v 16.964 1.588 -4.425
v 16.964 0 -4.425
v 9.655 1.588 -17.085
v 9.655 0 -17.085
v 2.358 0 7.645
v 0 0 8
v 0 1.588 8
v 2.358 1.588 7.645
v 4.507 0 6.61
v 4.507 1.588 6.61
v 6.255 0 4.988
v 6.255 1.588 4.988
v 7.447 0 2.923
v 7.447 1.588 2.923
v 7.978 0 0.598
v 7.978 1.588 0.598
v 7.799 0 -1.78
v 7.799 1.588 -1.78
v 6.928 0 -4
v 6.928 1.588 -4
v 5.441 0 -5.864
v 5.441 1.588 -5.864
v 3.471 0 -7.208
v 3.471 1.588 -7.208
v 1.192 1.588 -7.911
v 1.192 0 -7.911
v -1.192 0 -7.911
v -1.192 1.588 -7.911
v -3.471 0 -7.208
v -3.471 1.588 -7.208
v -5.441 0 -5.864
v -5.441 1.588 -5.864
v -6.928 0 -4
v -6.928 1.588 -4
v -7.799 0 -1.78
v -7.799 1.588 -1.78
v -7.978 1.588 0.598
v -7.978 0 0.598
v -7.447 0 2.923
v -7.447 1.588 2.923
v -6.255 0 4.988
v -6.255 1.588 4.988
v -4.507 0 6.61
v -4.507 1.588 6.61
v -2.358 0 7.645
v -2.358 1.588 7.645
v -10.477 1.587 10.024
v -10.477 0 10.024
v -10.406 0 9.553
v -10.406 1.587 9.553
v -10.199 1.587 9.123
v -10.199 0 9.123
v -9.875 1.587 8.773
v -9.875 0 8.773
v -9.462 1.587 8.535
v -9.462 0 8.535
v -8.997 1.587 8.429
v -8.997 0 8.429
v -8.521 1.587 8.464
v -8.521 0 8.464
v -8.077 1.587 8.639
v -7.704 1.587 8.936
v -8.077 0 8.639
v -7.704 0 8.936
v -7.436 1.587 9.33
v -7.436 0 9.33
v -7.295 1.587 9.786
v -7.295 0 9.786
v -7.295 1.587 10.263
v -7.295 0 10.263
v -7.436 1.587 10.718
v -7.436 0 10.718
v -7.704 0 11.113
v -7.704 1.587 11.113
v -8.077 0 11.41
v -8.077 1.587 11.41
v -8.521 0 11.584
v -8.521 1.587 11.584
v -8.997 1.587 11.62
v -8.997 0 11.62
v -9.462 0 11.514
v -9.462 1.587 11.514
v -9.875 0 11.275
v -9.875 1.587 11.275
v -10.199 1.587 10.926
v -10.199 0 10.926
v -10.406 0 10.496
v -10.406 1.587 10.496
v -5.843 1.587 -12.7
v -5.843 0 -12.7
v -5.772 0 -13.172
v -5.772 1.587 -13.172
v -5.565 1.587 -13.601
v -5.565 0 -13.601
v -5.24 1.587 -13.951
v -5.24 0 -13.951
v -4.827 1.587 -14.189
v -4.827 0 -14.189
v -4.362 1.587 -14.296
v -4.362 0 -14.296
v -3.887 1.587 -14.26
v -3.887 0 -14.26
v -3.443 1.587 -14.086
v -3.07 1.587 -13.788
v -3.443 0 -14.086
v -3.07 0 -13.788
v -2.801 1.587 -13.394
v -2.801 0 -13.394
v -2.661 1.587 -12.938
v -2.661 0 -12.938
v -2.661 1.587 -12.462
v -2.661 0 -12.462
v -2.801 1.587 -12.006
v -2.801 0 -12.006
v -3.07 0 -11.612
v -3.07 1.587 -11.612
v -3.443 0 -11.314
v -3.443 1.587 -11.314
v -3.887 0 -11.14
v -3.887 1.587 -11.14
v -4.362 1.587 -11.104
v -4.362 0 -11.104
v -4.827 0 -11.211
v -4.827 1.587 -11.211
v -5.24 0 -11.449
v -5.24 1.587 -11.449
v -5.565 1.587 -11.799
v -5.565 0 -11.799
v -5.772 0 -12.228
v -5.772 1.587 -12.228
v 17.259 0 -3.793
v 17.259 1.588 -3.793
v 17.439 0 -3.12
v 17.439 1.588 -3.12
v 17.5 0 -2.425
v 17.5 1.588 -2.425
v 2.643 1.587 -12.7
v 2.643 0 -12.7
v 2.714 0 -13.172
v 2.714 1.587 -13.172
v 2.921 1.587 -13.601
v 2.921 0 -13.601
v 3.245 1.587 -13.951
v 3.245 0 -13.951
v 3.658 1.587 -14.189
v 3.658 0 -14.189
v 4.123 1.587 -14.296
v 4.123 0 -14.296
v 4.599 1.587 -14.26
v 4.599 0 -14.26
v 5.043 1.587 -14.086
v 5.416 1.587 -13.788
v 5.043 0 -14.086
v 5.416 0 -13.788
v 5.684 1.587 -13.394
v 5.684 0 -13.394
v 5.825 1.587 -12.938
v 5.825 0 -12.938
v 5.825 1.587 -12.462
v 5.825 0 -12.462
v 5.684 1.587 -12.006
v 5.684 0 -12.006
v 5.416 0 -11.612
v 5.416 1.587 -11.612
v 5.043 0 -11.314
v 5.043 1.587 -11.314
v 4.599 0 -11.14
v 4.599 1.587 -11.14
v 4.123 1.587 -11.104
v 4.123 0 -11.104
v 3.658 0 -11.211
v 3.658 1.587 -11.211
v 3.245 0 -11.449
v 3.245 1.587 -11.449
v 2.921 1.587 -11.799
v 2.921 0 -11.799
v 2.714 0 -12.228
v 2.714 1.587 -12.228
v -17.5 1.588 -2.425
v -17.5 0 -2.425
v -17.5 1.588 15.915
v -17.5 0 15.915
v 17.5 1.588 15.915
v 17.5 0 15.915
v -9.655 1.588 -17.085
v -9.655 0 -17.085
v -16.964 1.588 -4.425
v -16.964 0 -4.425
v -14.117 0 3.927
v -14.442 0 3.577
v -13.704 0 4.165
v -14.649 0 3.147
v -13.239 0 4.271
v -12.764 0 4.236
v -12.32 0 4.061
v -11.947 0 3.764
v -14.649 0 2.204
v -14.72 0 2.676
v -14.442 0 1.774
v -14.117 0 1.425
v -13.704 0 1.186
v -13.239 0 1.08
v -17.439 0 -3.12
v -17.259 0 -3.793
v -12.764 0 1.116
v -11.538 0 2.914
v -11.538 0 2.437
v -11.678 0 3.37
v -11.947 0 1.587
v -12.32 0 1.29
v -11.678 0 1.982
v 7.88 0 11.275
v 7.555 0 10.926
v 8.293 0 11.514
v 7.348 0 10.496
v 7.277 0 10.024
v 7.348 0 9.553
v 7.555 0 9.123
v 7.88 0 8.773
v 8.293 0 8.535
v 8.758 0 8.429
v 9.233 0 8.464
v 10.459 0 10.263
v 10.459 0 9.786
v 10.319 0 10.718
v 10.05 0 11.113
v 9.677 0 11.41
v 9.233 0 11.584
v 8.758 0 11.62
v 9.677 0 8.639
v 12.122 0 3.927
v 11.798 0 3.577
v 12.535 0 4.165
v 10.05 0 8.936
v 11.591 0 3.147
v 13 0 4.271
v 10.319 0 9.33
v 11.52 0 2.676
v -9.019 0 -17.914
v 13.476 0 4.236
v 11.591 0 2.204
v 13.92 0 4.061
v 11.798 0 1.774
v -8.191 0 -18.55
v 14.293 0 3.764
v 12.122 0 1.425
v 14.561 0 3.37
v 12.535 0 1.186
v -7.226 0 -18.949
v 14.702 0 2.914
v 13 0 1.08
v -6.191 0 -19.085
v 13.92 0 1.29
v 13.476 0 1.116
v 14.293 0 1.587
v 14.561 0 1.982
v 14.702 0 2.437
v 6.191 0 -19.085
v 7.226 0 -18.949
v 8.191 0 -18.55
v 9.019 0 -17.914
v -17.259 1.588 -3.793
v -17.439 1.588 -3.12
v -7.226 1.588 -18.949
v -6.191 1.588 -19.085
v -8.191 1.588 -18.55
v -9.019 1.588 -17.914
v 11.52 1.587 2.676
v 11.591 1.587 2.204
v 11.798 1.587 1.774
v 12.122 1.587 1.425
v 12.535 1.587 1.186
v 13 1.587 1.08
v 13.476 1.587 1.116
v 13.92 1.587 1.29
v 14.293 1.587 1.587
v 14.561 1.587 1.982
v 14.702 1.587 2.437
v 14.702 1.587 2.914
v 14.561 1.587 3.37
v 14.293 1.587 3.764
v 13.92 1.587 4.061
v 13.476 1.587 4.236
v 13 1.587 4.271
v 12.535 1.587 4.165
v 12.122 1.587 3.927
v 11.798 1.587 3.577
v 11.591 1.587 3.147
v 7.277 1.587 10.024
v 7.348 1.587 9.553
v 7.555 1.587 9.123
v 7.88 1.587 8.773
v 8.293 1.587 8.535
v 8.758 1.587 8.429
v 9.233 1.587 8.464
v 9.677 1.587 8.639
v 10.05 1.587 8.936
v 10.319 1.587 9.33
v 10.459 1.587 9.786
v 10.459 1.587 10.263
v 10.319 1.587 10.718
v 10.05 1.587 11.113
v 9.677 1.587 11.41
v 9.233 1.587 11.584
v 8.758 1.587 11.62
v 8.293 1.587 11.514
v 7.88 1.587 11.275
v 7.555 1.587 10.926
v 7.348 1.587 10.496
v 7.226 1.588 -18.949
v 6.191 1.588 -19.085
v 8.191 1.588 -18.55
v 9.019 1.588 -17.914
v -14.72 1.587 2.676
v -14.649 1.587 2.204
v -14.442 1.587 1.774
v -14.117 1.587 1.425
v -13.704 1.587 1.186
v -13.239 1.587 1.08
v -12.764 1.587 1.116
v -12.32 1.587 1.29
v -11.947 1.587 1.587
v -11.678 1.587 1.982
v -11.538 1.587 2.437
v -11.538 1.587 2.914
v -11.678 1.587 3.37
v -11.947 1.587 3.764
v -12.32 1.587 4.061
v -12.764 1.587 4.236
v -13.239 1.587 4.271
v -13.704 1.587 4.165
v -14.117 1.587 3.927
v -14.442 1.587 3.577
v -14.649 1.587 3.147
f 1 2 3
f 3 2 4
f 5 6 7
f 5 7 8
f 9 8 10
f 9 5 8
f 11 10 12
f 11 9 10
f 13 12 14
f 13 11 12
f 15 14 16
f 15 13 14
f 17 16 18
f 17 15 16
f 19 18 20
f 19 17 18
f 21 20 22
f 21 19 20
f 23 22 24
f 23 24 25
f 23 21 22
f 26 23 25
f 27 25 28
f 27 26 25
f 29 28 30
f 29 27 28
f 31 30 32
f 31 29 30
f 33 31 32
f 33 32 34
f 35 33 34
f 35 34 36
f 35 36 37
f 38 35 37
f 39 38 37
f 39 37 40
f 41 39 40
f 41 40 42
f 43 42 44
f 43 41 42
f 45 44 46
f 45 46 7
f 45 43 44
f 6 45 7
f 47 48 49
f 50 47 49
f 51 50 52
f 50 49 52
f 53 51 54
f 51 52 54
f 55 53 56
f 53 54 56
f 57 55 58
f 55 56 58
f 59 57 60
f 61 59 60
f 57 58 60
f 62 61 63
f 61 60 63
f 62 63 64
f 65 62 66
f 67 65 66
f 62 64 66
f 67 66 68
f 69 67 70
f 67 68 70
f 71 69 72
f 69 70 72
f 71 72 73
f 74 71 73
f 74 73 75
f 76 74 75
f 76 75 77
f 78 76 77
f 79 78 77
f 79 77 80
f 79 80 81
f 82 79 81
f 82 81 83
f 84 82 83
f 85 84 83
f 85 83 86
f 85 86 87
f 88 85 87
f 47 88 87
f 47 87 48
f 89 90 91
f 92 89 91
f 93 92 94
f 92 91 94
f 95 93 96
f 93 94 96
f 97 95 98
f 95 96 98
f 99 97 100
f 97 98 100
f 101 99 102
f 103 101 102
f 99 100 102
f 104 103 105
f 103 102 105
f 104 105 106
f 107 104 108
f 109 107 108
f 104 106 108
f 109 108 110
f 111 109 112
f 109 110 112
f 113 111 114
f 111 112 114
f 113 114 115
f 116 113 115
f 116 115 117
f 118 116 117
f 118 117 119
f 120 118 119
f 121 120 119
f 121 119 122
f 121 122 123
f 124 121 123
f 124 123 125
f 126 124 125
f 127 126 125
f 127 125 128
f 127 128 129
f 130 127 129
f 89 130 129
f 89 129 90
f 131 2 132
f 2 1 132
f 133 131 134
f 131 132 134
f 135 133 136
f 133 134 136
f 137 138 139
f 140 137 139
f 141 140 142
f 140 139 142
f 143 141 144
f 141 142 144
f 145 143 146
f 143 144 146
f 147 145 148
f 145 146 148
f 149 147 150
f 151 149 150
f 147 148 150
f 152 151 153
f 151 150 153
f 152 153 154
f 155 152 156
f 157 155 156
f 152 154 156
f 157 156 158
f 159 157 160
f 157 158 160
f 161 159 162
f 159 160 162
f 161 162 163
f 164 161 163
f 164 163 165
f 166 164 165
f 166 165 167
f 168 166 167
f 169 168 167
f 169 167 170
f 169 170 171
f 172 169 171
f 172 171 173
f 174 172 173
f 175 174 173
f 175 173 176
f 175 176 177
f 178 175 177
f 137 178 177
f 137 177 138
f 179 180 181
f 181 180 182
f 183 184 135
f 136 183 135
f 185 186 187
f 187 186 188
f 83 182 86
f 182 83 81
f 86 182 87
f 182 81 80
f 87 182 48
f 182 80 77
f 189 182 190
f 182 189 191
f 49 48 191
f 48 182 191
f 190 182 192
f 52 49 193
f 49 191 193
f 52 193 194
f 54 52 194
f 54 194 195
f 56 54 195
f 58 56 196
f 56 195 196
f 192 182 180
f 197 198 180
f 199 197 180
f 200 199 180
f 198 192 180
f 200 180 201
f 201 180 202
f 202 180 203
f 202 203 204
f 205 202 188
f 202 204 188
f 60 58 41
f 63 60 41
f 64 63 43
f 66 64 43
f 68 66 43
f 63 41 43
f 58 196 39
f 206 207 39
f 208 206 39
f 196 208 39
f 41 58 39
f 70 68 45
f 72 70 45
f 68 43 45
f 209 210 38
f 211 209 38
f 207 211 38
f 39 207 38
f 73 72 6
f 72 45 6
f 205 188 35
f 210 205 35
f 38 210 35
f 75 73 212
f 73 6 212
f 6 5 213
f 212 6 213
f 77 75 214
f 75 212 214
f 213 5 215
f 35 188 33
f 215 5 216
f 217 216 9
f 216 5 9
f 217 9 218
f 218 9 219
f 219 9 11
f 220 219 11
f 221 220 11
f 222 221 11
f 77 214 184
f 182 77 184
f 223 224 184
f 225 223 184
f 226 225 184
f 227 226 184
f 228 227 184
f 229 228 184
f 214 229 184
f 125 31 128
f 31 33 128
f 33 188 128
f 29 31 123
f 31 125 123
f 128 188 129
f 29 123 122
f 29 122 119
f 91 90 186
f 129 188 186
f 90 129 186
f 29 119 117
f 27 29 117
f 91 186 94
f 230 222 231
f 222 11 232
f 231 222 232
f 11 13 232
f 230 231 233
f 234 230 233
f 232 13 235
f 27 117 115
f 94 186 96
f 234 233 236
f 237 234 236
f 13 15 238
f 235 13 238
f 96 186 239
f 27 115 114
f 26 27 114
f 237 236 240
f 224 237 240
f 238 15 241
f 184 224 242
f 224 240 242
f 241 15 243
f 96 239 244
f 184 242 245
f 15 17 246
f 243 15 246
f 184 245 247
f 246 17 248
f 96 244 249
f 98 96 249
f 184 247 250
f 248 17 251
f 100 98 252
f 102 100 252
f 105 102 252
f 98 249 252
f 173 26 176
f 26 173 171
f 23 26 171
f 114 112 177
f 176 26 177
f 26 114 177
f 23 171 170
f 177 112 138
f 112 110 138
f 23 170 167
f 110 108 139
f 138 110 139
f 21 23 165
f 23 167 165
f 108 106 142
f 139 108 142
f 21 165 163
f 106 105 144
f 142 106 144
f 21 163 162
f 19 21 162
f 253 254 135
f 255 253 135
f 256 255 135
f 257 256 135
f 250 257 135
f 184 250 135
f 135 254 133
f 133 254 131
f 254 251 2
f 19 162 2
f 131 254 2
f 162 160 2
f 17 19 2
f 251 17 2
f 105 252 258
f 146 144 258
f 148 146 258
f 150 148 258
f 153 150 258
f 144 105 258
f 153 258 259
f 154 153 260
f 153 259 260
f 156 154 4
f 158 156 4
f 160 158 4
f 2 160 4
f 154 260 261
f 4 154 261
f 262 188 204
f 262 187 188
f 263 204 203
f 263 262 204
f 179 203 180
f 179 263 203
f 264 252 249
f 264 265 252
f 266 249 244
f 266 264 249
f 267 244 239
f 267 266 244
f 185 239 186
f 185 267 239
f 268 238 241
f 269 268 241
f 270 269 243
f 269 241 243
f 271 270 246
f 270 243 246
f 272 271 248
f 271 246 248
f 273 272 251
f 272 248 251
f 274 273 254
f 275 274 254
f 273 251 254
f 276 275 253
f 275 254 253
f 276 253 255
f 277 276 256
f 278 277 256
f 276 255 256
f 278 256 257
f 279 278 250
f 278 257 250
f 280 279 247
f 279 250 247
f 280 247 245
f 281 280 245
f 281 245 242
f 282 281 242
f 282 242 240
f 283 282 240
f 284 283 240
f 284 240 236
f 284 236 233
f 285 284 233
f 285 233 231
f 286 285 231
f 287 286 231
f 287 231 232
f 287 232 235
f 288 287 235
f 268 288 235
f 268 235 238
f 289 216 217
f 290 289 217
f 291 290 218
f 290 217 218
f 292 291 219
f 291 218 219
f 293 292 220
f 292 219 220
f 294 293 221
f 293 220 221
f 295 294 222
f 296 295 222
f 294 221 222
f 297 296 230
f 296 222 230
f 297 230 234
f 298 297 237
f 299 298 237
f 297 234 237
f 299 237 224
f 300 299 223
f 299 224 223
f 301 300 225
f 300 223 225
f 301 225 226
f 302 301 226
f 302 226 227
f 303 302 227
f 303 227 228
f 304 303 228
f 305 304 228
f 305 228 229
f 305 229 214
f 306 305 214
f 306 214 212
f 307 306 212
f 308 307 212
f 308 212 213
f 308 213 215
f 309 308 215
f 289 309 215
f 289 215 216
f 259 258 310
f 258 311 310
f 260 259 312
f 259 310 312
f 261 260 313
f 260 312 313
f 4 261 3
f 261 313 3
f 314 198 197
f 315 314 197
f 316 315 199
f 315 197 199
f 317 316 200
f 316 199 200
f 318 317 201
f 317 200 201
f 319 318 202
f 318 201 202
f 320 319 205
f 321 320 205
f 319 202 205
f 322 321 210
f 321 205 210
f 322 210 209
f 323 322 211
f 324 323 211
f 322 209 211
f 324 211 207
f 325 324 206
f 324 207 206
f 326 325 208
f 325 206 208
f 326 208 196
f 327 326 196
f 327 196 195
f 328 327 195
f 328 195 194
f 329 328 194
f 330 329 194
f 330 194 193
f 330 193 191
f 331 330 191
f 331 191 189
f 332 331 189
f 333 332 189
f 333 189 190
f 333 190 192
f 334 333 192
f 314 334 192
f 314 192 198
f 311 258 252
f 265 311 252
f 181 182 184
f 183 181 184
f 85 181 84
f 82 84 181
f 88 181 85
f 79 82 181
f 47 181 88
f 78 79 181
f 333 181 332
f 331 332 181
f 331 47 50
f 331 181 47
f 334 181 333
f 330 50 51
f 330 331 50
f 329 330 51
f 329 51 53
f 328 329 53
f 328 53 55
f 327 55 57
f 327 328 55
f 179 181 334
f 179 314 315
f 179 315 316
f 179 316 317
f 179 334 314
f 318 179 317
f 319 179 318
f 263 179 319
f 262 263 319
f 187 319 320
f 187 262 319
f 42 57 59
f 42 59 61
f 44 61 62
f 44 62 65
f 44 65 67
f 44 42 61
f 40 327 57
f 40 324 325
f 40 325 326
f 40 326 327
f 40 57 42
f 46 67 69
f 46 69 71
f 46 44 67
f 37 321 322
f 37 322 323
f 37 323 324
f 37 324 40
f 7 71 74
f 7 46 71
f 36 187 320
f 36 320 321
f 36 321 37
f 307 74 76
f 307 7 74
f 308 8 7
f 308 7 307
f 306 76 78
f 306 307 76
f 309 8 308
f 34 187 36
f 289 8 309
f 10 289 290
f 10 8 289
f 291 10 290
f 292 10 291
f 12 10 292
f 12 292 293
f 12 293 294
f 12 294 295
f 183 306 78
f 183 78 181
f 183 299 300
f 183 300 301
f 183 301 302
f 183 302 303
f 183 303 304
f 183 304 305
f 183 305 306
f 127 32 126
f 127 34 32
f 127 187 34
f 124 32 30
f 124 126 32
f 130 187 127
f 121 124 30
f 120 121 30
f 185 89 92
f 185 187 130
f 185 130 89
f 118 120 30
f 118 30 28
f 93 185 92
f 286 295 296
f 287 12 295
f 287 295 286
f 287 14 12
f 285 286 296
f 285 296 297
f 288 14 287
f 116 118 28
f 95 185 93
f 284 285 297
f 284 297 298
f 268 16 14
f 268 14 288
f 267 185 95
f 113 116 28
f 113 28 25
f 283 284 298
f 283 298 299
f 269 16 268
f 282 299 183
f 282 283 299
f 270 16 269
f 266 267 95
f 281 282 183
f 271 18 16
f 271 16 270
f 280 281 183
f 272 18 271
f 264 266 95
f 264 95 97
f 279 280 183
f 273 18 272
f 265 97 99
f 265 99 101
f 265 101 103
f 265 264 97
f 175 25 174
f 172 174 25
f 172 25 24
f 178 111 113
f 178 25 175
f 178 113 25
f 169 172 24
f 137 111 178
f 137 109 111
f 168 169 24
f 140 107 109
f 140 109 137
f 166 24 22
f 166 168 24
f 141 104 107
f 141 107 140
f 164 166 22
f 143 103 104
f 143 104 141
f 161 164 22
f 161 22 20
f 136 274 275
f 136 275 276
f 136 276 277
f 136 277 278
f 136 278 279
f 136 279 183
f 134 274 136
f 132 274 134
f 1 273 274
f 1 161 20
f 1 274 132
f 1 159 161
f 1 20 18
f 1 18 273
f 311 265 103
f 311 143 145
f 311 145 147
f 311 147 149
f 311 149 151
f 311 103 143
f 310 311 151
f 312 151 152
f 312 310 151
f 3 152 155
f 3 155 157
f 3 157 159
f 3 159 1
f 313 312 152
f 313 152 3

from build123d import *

# Parameters (mm, degrees)
SKETCH10_R           = 8
BOSS_EXTRUDE2_DEPTH  = 1.5875
M3_CLEARANCE_HOLE1_D = 3.2
FILLET2_R            = 4


with BuildPart() as part:
    # Sketch10 → Boss-Extrude2 (new body)
    with BuildSketch(Plane(origin=(0, 0, 0), x_dir=(1, 0, 0), z_dir=(0, 1, 0))):
        Polygon((8.5, 19.085417438), (-8.5, 19.085417438), (-17.5, 3.49696017), (-17.5, -15.914582562), (17.5, -15.914582562), (17.5, 3.49696017), align=None)
        Circle(SKETCH10_R, mode=Mode.SUBTRACT)
    extrude(amount=BOSS_EXTRUDE2_DEPTH)

    # M3 Clearance Hole1 (through all)
    with Locations(Plane(origin=(0, 1.5875, 0), x_dir=(1, 0, 0), z_dir=(0, 1, 0))):
        with Locations((-8.877202285, -10.024234614), (-13.119842972, -2.675765386), (-4.242640687, 12.7), (4.242640687, 12.7), (13.119842972, -2.675765386), (8.877202285, -10.024234614)):
            Hole(M3_CLEARANCE_HOLE1_D / 2)

    # Fillet2
    fillet2_edges = [part.edges().sort_by_distance(p)[0] for p in [
        (-17.5, 0.79375, -3.49696017),
        (-8.5, 0.79375, -19.085417438),
        (17.5, 0.79375, -3.49696017),
        (8.5, 0.79375, -19.085417438),
    ]]
    fillet(fillet2_edges, radius=FILLET2_R)


solid = part.part
